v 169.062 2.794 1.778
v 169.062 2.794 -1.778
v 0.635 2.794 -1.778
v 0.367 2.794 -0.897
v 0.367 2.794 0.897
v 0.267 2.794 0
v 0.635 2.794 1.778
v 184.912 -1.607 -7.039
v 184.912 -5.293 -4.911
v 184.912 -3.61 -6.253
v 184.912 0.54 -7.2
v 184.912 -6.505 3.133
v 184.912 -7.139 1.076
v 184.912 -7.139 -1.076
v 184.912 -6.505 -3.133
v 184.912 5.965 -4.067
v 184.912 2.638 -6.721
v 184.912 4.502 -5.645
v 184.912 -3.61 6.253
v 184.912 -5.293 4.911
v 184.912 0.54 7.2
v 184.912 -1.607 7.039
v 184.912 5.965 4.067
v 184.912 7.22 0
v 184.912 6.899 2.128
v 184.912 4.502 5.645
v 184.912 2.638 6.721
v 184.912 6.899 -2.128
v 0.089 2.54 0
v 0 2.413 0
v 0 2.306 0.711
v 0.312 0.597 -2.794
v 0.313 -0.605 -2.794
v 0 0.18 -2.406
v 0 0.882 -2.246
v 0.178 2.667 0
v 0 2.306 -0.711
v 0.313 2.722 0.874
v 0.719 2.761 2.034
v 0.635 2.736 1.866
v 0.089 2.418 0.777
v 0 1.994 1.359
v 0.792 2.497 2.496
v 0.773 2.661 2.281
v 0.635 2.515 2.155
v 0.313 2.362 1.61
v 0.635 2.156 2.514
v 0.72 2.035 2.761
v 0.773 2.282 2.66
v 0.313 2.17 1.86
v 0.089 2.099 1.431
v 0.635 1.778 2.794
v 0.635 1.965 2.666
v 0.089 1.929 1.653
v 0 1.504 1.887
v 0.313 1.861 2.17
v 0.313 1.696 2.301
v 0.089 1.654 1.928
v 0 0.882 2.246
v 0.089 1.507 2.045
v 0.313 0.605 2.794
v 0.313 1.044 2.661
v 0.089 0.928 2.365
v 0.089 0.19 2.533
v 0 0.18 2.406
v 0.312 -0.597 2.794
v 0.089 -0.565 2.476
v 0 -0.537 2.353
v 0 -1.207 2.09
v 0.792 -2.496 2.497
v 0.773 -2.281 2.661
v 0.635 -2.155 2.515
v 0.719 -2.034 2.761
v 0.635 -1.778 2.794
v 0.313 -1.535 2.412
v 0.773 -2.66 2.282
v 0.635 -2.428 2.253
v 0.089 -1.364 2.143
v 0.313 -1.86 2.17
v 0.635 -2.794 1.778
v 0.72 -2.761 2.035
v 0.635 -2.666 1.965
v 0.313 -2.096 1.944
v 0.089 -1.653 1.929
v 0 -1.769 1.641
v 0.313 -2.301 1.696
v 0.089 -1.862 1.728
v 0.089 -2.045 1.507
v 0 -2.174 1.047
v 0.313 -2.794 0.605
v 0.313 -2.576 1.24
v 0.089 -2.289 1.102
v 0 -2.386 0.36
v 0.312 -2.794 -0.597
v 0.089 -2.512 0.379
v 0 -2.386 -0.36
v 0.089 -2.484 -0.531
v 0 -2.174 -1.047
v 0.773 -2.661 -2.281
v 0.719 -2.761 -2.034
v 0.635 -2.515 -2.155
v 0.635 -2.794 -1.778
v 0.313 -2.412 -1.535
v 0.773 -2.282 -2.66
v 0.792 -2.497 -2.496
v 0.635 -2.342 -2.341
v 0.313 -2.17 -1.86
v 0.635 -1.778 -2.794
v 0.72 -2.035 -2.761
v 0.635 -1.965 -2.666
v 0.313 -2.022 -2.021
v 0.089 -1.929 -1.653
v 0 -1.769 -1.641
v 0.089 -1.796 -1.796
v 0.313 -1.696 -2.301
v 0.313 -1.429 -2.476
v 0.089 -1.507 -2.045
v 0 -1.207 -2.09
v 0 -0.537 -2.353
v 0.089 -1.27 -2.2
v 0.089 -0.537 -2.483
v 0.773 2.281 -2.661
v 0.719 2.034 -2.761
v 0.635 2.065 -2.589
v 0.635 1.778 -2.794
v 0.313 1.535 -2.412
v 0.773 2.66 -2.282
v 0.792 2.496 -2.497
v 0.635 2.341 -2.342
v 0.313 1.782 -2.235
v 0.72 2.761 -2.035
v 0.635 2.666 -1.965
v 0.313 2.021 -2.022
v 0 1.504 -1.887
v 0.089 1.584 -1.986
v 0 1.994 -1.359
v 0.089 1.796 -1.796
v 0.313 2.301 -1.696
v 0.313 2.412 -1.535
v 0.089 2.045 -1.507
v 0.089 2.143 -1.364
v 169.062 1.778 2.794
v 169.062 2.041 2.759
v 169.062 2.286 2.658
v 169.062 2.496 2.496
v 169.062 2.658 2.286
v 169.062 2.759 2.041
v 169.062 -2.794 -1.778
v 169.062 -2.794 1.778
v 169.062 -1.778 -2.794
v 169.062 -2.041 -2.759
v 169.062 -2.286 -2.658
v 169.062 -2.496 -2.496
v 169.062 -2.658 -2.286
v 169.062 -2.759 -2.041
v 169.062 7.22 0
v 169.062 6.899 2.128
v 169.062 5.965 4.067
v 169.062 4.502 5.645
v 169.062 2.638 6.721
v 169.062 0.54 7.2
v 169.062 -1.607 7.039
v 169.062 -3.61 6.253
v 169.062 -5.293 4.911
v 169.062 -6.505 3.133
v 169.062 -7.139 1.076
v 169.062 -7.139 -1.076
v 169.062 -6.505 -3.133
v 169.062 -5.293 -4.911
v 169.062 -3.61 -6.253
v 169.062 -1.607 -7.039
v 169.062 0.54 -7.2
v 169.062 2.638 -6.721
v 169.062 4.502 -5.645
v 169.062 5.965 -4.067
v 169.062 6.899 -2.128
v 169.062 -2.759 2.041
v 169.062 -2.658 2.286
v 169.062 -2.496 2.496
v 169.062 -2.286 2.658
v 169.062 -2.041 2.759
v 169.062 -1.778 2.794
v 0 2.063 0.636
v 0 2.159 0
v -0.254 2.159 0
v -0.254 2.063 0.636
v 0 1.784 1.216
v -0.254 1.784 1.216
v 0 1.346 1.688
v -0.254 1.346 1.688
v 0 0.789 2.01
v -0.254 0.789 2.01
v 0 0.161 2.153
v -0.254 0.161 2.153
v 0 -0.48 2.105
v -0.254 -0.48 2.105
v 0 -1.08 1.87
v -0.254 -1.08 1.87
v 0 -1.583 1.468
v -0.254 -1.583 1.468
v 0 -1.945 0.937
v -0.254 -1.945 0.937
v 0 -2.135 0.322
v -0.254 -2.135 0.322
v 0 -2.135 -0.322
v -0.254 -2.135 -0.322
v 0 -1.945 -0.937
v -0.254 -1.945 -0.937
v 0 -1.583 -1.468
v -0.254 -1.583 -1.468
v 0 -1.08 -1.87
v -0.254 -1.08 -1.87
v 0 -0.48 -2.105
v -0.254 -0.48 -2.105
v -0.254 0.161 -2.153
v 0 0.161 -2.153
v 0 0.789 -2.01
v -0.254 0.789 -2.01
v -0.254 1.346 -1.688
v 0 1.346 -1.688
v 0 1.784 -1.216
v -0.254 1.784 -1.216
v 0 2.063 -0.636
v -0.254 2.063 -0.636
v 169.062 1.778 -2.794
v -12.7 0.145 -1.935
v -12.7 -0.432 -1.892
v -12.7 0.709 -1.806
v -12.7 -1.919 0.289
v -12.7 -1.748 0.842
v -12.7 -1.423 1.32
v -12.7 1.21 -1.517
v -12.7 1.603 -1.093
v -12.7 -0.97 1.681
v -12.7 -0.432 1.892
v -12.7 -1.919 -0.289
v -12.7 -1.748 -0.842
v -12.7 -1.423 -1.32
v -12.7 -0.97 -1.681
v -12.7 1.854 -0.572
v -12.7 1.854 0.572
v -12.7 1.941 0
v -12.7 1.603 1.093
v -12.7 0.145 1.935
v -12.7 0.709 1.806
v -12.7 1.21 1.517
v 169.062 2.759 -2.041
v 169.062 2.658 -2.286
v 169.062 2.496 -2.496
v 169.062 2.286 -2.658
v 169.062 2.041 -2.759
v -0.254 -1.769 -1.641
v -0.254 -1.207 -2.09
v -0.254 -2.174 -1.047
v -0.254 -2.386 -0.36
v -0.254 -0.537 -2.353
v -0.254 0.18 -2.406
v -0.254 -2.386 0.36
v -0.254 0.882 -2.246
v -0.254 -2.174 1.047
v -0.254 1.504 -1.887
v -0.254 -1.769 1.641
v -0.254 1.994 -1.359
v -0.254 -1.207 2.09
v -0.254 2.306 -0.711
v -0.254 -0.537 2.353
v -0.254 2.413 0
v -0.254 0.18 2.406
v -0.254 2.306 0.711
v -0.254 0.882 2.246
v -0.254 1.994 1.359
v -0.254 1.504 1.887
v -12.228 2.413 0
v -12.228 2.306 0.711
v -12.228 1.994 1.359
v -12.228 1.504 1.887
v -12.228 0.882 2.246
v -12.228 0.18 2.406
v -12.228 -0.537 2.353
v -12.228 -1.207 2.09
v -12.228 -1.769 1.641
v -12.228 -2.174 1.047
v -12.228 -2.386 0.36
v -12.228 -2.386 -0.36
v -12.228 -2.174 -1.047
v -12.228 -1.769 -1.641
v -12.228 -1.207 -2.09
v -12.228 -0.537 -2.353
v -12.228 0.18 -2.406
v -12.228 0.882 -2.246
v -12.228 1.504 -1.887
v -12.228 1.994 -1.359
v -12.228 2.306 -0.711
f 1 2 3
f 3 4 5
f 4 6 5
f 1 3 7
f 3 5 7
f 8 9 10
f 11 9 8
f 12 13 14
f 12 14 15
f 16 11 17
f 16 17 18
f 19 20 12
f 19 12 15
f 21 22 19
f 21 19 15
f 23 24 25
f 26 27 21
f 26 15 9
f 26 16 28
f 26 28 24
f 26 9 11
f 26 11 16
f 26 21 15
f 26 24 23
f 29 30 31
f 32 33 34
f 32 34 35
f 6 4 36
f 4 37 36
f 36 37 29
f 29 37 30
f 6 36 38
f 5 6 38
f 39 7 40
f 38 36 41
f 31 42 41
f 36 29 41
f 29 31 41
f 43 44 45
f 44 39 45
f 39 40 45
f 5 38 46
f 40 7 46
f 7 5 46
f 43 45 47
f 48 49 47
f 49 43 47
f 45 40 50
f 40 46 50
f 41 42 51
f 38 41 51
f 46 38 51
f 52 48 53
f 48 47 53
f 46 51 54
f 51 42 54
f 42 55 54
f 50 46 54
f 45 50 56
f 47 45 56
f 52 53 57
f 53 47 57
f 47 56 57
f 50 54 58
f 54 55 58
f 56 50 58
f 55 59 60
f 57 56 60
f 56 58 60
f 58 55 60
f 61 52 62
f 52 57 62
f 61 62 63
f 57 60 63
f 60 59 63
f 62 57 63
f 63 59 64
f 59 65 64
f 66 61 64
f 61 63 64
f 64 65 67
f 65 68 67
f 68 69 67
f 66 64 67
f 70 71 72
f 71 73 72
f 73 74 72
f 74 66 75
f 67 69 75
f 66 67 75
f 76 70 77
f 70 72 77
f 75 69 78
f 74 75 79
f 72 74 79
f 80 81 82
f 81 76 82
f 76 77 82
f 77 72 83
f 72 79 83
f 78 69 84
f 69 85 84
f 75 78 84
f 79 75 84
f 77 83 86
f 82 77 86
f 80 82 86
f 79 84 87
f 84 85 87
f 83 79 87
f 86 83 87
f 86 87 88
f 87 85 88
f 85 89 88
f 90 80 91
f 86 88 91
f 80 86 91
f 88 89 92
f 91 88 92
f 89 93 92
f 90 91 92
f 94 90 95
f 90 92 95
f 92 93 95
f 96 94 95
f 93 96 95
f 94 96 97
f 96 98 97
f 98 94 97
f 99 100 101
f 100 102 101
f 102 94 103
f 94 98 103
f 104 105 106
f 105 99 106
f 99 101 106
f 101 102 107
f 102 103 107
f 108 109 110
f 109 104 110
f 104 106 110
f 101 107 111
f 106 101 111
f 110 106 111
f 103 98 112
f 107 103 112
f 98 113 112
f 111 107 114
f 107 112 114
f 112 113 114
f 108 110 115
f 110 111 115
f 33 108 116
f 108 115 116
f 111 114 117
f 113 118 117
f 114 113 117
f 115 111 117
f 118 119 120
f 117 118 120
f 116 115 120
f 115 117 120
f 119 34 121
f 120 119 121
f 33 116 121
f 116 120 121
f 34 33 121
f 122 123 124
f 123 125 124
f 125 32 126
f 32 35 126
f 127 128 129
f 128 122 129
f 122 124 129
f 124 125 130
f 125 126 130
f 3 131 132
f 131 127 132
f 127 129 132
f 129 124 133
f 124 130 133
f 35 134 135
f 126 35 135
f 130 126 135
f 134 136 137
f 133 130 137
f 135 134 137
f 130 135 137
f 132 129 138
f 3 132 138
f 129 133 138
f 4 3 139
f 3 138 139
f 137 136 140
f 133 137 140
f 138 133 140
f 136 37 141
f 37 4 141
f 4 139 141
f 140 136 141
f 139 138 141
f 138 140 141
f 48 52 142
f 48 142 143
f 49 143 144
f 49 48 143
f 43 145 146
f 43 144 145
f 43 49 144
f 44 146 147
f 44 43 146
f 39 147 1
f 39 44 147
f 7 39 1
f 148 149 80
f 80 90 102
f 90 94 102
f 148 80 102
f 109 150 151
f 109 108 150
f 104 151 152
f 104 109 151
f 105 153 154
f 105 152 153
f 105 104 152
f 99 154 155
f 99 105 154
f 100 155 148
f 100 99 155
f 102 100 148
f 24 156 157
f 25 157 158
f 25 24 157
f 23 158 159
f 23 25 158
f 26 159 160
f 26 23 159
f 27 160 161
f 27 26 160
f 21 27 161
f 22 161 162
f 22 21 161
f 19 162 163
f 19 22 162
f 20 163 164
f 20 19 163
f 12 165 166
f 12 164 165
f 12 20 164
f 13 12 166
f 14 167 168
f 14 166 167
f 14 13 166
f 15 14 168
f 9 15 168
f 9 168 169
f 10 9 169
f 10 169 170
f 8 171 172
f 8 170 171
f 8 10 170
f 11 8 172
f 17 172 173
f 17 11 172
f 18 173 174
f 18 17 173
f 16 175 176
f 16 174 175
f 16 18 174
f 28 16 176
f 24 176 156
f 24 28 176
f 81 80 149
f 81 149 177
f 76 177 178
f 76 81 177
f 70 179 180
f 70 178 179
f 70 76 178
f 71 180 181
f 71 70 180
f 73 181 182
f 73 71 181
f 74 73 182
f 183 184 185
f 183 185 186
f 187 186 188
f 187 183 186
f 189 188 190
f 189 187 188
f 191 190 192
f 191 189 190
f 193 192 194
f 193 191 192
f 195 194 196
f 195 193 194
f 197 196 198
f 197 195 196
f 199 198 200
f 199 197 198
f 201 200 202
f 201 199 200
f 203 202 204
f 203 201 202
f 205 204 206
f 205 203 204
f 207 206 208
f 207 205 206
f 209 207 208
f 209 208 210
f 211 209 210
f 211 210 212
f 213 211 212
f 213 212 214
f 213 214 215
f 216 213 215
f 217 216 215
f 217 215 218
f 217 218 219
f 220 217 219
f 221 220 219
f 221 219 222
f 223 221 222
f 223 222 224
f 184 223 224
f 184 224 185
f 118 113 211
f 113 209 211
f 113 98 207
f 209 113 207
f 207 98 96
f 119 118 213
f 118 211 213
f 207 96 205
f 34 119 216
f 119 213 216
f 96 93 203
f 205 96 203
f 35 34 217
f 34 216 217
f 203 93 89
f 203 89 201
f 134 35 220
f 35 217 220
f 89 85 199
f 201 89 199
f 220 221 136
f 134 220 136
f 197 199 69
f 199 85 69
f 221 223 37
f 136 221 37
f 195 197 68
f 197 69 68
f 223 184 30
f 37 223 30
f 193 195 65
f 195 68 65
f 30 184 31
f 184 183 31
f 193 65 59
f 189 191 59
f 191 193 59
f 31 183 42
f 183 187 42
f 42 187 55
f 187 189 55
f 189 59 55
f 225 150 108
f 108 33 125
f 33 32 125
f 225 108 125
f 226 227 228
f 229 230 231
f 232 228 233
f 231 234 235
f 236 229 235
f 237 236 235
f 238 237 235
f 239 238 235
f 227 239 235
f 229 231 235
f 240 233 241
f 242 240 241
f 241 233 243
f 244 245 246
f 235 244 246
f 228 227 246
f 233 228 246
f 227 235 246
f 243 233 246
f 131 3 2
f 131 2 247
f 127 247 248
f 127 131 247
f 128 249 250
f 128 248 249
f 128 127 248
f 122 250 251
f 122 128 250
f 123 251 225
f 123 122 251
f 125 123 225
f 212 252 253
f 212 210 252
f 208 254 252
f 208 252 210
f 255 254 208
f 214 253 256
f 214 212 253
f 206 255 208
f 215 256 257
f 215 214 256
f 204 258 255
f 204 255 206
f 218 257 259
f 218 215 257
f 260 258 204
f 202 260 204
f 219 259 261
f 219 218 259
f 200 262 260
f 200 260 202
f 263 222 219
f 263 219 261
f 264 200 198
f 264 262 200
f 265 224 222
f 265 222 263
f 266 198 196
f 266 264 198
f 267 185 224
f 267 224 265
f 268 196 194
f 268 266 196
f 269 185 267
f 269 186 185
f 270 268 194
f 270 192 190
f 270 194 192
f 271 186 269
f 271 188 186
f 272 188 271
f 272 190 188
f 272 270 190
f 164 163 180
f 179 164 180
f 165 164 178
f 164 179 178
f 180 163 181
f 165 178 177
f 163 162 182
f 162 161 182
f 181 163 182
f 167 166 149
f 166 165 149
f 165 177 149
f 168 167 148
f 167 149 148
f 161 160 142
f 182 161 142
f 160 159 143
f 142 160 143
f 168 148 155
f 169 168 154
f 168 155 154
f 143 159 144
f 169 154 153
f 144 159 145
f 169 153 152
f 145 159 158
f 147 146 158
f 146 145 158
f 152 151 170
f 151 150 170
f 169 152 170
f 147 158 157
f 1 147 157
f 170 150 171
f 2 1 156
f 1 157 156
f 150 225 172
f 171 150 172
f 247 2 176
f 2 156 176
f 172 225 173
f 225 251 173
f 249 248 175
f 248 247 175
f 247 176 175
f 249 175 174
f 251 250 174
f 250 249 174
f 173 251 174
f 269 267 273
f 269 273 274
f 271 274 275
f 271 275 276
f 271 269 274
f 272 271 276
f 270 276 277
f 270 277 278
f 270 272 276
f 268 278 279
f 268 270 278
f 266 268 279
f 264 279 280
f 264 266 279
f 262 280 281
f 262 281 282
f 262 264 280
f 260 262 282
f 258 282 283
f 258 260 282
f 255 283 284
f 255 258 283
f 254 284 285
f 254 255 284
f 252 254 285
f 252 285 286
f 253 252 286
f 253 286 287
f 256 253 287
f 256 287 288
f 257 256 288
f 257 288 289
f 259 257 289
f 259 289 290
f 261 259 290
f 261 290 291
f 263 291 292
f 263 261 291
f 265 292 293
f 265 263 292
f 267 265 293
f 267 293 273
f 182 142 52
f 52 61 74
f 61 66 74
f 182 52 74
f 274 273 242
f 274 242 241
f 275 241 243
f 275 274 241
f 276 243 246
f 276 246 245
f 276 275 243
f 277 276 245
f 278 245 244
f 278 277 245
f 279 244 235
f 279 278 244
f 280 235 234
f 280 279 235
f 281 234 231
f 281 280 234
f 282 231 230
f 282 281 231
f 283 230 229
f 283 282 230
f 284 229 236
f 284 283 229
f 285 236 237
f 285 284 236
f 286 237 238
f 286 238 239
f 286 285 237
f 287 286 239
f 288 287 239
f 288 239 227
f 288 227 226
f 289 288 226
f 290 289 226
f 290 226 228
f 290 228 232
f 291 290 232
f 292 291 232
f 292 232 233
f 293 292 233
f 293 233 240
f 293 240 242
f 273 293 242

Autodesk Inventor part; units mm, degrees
sketch "Sketch_1" plane through (0, 0, 0) normal (0, 0, 1) x (1, 0, 0)
  line L0 (184.912, 0) -> (0, 0)
  line L1 (0, 0) -> (0, 2.413)
  arc A0 (1.27, 4.191) -> (0, 2.413) centre (86.3143, -57.8975) ccw
  line L2 (1.27, 4.191) -> (169.0624, 4.191)
  line L3 (169.0624, 4.191) -> (169.0624, 7.22)
  line L4 (169.0624, 7.22) -> (184.912, 7.22)
  line L5 (184.912, 7.22) -> (184.912, 0)
  line L6 (184.912, 0) -> (0, 0)
revolve "Revolution1" add sketch "Sketch_1" angle 360 about axis through (184.912, 0, 0) along (1, 0, 0)
sketch "Sketch_3" plane through (0, 0, 0) normal (0, 0, 1) x (1, 0, 0)
  line L0 (0, 0) -> (-12.7, 0)
  line L1 (-12.7, 0) -> (-12.7, 1.9406)
  line L2 (-12.7, 1.9406) -> (-12.2276, 2.413)
  line L3 (-12.2276, 2.413) -> (0, 2.413)
  line L4 (0, 2.413) -> (0, 0)
  line L5 (0, 0) -> (-12.7, 0)
revolve "Revolution2" add sketch "Sketch_3" angle 360 about axis through (0, 0, 0) along (1, 0, 0)
thread "Thread1" size "10-32 UNF" class "2A" standard "ANSI Unified Screw Threads" full length
sketch "Sketch_31" plane through (0, 0, 0) normal (1, 0, 0) x (0, 0, -1)
  line L0 (-5.588, 5.588) -> (-5.588, -5.588)
  line L1 (-5.588, -5.588) -> (5.588, -5.588)
  line L2 (5.588, -5.588) -> (5.588, 5.588)
  line L3 (5.588, 5.588) -> (-5.588, 5.588)
  line L4 (-2.794, 1.778) -> (-2.794, -1.778)
  arc A0 (-2.794, -1.778) -> (-1.778, -2.794) centre (-1.778, -1.778) ccw
  line L5 (-1.778, -2.794) -> (1.778, -2.794)
  arc A1 (1.778, -2.794) -> (2.794, -1.778) centre (1.778, -1.778) ccw
  line L6 (2.794, -1.778) -> (2.794, 1.778)
  arc A2 (2.794, 1.778) -> (1.778, 2.794) centre (1.778, 1.778) ccw
  line L7 (1.778, 2.794) -> (-1.778, 2.794)
  arc A3 (-1.778, 2.794) -> (-2.794, 1.778) centre (-1.778, 1.778) ccw
extrude "Extrusion1" cut sketch "Sketch_31" along normal mid plane 338.1248
sketch "Sketch_30" plane through (0, 0, 0) normal (0, 0, 1) x (1, 0, 0)
  line L0 (0, 0) -> (-0.254, 0)
  line L1 (-0.254, 2.413) -> (-0.254, 2.159)
  line L2 (-0.254, 2.159) -> (0, 2.159)
  line L3 (0, 2.159) -> (0, 2.413)
  line L4 (0, 2.413) -> (-0.254, 2.413)
revolve "Revolution3" cut sketch "Sketch_30" angle 360 about axis through (0, 0, 0) along (1, 0, 0)
ref_plane "rod_cp_XY" through (0, 0, 0) normal (1, 0, 0) x (0, 0, -1)
ref_plane "rod_cp_YZ" through (0, 0, 0) normal (0, 0, -1) x (0, 1, 0)
ref_plane "rod_cp_ZX" through (0, 0, 0) normal (0, 1, 0) x (1, 0, 0)
ref_plane "to_rod_clevis_XY" through (-12.7, 0, 0) normal (1, 0, 0) x (0, 0, -1)
ref_plane "to_rod_clevis_YZ" through (-12.7, 0, 0) normal (0, 0, -1) x (0, 1, 0)
ref_plane "to_rod_clevis_ZX" through (-12.7, 0, 0) normal (0, 1, 0) x (1, 0, 0)
ref_plane "rl22_XY" through (0, 0, 0) normal (1, 0, 0) x (0, 0, -1)
ref_plane "rl22_YZ" through (0, 0, 0) normal (0, 0, -1) x (0, 1, 0)
ref_plane "rl22_ZX" through (0, 0, 0) normal (0, 1, 0) x (1, 0, 0)
ref_plane "rl1_XY" through (-12.7, 0, 0) normal (1, 0, 0) x (0, 0, -1)
ref_plane "rl1_YZ" through (-12.7, 0, 0) normal (0, 0, -1) x (0, 1, 0)
ref_plane "rl1_ZX" through (-12.7, 0, 0) normal (0, 1, 0) x (1, 0, 0)
ref_plane "thd1_XY" through (-12.7, 2.413, 0) normal (1, 0, 0) x (0, 0, -1)
ref_plane "thd1_YZ" through (-12.7, 2.413, 0) normal (0, 0, -1) x (0, 1, 0)
ref_plane "thd1_ZX" through (-12.7, 2.413, 0) normal (0, 1, 0) x (1, 0, 0)
ref_plane "thd2_XY" through (-12.7, -2.413, 0) normal (1, 0, 0) x (0, 0, -1)
ref_plane "thd2_YZ" through (-12.7, -2.413, 0) normal (0, 0, -1) x (0, 1, 0)
ref_plane "thd2_ZX" through (-12.7, -2.413, 0) normal (0, 1, 0) x (1, 0, 0)
ref_plane "dia1_XY" through (0, 2.794, 0) normal (1, 0, 0) x (0, 0, -1)
ref_plane "dia1_YZ" through (0, 2.794, 0) normal (0, 0, -1) x (0, 1, 0)
ref_plane "dia1_ZX" through (0, 2.794, 0) normal (0, 1, 0) x (1, 0, 0)
ref_plane "dia2_XY" through (0, -2.794, 0) normal (1, 0, 0) x (0, 0, -1)
ref_plane "dia2_YZ" through (0, -2.794, 0) normal (0, 0, -1) x (0, 1, 0)
ref_plane "dia2_ZX" through (0, -2.794, 0) normal (0, 1, 0) x (1, 0, 0)
ref_plane "stroke11_XY" through (0, 0, 0) normal (1, 0, 0) x (0, 0, -1)
ref_plane "stroke11_YZ" through (0, 0, 0) normal (0, 0, -1) x (0, 1, 0)
ref_plane "stroke11_ZX" through (0, 0, 0) normal (0, 1, 0) x (1, 0, 0)
ref_plane "h1_XY" through (3.175, 0, 0) normal (0, 0, 1) x (1, 0, 0)
ref_plane "h1_YZ" through (3.175, 0, 0) normal (1, 0, 0) x (0, 1, 0)
ref_plane "h1_ZX" through (3.175, 0, 0) normal (0, 1, 0) x (0, 0, 1)
ref_plane "h2_XY" through (0, 0, 0) normal (0, 0, 1) x (1, 0, 0)
ref_plane "h2_YZ" through (0, 0, 0) normal (1, 0, 0) x (0, 1, 0)
ref_plane "h2_ZX" through (0, 0, 0) normal (0, 1, 0) x (0, 0, 1)
ref_plane "h3_XY" through (0, 0, 0) normal (0, 0, 1) x (1, 0, 0)
ref_plane "h3_YZ" through (0, 0, 0) normal (1, 0, 0) x (0, 1, 0)
ref_plane "h3_ZX" through (0, 0, 0) normal (0, 1, 0) x (0, 0, 1)
ref_plane "rl2_XY" through (0, 0, 0) normal (1, 0, 0) x (0, 0, -1)
ref_plane "rl2_YZ" through (0, 0, 0) normal (0, 0, -1) x (0, 1, 0)
ref_plane "rl2_ZX" through (0, 0, 0) normal (0, 1, 0) x (1, 0, 0)
ref_plane "stroke1_XY" through (0, 0, 0) normal (1, 0, 0) x (0, 0, -1)
ref_plane "stroke1_YZ" through (0, 0, 0) normal (0, 0, -1) x (0, 1, 0)
ref_plane "stroke1_ZX" through (0, 0, 0) normal (0, 1, 0) x (1, 0, 0)
ref_plane "dia12_XY" through (0, 0, 7.8105) normal (1, 0, 0) x (0, 0, -1)
ref_plane "dia12_YZ" through (0, 0, 7.8105) normal (0, 0, -1) x (0, 1, 0)
ref_plane "dia12_ZX" through (0, 0, 7.8105) normal (0, 1, 0) x (1, 0, 0)
ref_plane "dia22_XY" through (0, 0, -7.8105) normal (1, 0, 0) x (0, 0, -1)
ref_plane "dia22_YZ" through (0, 0, -7.8105) normal (0, 0, -1) x (0, 1, 0)
ref_plane "dia22_ZX" through (0, 0, -7.8105) normal (0, 1, 0) x (1, 0, 0)
ref_plane "stroke1bf_XY" through (0, 0, 0) normal (1, 0, 0) x (0, 0, -1)
ref_plane "stroke1bf_YZ" through (0, 0, 0) normal (0, 0, -1) x (0, 1, 0)
ref_plane "stroke1bf_ZX" through (0, 0, 0) normal (0, 1, 0) x (1, 0, 0)
properties part number "025.5-D_NR_rod"
